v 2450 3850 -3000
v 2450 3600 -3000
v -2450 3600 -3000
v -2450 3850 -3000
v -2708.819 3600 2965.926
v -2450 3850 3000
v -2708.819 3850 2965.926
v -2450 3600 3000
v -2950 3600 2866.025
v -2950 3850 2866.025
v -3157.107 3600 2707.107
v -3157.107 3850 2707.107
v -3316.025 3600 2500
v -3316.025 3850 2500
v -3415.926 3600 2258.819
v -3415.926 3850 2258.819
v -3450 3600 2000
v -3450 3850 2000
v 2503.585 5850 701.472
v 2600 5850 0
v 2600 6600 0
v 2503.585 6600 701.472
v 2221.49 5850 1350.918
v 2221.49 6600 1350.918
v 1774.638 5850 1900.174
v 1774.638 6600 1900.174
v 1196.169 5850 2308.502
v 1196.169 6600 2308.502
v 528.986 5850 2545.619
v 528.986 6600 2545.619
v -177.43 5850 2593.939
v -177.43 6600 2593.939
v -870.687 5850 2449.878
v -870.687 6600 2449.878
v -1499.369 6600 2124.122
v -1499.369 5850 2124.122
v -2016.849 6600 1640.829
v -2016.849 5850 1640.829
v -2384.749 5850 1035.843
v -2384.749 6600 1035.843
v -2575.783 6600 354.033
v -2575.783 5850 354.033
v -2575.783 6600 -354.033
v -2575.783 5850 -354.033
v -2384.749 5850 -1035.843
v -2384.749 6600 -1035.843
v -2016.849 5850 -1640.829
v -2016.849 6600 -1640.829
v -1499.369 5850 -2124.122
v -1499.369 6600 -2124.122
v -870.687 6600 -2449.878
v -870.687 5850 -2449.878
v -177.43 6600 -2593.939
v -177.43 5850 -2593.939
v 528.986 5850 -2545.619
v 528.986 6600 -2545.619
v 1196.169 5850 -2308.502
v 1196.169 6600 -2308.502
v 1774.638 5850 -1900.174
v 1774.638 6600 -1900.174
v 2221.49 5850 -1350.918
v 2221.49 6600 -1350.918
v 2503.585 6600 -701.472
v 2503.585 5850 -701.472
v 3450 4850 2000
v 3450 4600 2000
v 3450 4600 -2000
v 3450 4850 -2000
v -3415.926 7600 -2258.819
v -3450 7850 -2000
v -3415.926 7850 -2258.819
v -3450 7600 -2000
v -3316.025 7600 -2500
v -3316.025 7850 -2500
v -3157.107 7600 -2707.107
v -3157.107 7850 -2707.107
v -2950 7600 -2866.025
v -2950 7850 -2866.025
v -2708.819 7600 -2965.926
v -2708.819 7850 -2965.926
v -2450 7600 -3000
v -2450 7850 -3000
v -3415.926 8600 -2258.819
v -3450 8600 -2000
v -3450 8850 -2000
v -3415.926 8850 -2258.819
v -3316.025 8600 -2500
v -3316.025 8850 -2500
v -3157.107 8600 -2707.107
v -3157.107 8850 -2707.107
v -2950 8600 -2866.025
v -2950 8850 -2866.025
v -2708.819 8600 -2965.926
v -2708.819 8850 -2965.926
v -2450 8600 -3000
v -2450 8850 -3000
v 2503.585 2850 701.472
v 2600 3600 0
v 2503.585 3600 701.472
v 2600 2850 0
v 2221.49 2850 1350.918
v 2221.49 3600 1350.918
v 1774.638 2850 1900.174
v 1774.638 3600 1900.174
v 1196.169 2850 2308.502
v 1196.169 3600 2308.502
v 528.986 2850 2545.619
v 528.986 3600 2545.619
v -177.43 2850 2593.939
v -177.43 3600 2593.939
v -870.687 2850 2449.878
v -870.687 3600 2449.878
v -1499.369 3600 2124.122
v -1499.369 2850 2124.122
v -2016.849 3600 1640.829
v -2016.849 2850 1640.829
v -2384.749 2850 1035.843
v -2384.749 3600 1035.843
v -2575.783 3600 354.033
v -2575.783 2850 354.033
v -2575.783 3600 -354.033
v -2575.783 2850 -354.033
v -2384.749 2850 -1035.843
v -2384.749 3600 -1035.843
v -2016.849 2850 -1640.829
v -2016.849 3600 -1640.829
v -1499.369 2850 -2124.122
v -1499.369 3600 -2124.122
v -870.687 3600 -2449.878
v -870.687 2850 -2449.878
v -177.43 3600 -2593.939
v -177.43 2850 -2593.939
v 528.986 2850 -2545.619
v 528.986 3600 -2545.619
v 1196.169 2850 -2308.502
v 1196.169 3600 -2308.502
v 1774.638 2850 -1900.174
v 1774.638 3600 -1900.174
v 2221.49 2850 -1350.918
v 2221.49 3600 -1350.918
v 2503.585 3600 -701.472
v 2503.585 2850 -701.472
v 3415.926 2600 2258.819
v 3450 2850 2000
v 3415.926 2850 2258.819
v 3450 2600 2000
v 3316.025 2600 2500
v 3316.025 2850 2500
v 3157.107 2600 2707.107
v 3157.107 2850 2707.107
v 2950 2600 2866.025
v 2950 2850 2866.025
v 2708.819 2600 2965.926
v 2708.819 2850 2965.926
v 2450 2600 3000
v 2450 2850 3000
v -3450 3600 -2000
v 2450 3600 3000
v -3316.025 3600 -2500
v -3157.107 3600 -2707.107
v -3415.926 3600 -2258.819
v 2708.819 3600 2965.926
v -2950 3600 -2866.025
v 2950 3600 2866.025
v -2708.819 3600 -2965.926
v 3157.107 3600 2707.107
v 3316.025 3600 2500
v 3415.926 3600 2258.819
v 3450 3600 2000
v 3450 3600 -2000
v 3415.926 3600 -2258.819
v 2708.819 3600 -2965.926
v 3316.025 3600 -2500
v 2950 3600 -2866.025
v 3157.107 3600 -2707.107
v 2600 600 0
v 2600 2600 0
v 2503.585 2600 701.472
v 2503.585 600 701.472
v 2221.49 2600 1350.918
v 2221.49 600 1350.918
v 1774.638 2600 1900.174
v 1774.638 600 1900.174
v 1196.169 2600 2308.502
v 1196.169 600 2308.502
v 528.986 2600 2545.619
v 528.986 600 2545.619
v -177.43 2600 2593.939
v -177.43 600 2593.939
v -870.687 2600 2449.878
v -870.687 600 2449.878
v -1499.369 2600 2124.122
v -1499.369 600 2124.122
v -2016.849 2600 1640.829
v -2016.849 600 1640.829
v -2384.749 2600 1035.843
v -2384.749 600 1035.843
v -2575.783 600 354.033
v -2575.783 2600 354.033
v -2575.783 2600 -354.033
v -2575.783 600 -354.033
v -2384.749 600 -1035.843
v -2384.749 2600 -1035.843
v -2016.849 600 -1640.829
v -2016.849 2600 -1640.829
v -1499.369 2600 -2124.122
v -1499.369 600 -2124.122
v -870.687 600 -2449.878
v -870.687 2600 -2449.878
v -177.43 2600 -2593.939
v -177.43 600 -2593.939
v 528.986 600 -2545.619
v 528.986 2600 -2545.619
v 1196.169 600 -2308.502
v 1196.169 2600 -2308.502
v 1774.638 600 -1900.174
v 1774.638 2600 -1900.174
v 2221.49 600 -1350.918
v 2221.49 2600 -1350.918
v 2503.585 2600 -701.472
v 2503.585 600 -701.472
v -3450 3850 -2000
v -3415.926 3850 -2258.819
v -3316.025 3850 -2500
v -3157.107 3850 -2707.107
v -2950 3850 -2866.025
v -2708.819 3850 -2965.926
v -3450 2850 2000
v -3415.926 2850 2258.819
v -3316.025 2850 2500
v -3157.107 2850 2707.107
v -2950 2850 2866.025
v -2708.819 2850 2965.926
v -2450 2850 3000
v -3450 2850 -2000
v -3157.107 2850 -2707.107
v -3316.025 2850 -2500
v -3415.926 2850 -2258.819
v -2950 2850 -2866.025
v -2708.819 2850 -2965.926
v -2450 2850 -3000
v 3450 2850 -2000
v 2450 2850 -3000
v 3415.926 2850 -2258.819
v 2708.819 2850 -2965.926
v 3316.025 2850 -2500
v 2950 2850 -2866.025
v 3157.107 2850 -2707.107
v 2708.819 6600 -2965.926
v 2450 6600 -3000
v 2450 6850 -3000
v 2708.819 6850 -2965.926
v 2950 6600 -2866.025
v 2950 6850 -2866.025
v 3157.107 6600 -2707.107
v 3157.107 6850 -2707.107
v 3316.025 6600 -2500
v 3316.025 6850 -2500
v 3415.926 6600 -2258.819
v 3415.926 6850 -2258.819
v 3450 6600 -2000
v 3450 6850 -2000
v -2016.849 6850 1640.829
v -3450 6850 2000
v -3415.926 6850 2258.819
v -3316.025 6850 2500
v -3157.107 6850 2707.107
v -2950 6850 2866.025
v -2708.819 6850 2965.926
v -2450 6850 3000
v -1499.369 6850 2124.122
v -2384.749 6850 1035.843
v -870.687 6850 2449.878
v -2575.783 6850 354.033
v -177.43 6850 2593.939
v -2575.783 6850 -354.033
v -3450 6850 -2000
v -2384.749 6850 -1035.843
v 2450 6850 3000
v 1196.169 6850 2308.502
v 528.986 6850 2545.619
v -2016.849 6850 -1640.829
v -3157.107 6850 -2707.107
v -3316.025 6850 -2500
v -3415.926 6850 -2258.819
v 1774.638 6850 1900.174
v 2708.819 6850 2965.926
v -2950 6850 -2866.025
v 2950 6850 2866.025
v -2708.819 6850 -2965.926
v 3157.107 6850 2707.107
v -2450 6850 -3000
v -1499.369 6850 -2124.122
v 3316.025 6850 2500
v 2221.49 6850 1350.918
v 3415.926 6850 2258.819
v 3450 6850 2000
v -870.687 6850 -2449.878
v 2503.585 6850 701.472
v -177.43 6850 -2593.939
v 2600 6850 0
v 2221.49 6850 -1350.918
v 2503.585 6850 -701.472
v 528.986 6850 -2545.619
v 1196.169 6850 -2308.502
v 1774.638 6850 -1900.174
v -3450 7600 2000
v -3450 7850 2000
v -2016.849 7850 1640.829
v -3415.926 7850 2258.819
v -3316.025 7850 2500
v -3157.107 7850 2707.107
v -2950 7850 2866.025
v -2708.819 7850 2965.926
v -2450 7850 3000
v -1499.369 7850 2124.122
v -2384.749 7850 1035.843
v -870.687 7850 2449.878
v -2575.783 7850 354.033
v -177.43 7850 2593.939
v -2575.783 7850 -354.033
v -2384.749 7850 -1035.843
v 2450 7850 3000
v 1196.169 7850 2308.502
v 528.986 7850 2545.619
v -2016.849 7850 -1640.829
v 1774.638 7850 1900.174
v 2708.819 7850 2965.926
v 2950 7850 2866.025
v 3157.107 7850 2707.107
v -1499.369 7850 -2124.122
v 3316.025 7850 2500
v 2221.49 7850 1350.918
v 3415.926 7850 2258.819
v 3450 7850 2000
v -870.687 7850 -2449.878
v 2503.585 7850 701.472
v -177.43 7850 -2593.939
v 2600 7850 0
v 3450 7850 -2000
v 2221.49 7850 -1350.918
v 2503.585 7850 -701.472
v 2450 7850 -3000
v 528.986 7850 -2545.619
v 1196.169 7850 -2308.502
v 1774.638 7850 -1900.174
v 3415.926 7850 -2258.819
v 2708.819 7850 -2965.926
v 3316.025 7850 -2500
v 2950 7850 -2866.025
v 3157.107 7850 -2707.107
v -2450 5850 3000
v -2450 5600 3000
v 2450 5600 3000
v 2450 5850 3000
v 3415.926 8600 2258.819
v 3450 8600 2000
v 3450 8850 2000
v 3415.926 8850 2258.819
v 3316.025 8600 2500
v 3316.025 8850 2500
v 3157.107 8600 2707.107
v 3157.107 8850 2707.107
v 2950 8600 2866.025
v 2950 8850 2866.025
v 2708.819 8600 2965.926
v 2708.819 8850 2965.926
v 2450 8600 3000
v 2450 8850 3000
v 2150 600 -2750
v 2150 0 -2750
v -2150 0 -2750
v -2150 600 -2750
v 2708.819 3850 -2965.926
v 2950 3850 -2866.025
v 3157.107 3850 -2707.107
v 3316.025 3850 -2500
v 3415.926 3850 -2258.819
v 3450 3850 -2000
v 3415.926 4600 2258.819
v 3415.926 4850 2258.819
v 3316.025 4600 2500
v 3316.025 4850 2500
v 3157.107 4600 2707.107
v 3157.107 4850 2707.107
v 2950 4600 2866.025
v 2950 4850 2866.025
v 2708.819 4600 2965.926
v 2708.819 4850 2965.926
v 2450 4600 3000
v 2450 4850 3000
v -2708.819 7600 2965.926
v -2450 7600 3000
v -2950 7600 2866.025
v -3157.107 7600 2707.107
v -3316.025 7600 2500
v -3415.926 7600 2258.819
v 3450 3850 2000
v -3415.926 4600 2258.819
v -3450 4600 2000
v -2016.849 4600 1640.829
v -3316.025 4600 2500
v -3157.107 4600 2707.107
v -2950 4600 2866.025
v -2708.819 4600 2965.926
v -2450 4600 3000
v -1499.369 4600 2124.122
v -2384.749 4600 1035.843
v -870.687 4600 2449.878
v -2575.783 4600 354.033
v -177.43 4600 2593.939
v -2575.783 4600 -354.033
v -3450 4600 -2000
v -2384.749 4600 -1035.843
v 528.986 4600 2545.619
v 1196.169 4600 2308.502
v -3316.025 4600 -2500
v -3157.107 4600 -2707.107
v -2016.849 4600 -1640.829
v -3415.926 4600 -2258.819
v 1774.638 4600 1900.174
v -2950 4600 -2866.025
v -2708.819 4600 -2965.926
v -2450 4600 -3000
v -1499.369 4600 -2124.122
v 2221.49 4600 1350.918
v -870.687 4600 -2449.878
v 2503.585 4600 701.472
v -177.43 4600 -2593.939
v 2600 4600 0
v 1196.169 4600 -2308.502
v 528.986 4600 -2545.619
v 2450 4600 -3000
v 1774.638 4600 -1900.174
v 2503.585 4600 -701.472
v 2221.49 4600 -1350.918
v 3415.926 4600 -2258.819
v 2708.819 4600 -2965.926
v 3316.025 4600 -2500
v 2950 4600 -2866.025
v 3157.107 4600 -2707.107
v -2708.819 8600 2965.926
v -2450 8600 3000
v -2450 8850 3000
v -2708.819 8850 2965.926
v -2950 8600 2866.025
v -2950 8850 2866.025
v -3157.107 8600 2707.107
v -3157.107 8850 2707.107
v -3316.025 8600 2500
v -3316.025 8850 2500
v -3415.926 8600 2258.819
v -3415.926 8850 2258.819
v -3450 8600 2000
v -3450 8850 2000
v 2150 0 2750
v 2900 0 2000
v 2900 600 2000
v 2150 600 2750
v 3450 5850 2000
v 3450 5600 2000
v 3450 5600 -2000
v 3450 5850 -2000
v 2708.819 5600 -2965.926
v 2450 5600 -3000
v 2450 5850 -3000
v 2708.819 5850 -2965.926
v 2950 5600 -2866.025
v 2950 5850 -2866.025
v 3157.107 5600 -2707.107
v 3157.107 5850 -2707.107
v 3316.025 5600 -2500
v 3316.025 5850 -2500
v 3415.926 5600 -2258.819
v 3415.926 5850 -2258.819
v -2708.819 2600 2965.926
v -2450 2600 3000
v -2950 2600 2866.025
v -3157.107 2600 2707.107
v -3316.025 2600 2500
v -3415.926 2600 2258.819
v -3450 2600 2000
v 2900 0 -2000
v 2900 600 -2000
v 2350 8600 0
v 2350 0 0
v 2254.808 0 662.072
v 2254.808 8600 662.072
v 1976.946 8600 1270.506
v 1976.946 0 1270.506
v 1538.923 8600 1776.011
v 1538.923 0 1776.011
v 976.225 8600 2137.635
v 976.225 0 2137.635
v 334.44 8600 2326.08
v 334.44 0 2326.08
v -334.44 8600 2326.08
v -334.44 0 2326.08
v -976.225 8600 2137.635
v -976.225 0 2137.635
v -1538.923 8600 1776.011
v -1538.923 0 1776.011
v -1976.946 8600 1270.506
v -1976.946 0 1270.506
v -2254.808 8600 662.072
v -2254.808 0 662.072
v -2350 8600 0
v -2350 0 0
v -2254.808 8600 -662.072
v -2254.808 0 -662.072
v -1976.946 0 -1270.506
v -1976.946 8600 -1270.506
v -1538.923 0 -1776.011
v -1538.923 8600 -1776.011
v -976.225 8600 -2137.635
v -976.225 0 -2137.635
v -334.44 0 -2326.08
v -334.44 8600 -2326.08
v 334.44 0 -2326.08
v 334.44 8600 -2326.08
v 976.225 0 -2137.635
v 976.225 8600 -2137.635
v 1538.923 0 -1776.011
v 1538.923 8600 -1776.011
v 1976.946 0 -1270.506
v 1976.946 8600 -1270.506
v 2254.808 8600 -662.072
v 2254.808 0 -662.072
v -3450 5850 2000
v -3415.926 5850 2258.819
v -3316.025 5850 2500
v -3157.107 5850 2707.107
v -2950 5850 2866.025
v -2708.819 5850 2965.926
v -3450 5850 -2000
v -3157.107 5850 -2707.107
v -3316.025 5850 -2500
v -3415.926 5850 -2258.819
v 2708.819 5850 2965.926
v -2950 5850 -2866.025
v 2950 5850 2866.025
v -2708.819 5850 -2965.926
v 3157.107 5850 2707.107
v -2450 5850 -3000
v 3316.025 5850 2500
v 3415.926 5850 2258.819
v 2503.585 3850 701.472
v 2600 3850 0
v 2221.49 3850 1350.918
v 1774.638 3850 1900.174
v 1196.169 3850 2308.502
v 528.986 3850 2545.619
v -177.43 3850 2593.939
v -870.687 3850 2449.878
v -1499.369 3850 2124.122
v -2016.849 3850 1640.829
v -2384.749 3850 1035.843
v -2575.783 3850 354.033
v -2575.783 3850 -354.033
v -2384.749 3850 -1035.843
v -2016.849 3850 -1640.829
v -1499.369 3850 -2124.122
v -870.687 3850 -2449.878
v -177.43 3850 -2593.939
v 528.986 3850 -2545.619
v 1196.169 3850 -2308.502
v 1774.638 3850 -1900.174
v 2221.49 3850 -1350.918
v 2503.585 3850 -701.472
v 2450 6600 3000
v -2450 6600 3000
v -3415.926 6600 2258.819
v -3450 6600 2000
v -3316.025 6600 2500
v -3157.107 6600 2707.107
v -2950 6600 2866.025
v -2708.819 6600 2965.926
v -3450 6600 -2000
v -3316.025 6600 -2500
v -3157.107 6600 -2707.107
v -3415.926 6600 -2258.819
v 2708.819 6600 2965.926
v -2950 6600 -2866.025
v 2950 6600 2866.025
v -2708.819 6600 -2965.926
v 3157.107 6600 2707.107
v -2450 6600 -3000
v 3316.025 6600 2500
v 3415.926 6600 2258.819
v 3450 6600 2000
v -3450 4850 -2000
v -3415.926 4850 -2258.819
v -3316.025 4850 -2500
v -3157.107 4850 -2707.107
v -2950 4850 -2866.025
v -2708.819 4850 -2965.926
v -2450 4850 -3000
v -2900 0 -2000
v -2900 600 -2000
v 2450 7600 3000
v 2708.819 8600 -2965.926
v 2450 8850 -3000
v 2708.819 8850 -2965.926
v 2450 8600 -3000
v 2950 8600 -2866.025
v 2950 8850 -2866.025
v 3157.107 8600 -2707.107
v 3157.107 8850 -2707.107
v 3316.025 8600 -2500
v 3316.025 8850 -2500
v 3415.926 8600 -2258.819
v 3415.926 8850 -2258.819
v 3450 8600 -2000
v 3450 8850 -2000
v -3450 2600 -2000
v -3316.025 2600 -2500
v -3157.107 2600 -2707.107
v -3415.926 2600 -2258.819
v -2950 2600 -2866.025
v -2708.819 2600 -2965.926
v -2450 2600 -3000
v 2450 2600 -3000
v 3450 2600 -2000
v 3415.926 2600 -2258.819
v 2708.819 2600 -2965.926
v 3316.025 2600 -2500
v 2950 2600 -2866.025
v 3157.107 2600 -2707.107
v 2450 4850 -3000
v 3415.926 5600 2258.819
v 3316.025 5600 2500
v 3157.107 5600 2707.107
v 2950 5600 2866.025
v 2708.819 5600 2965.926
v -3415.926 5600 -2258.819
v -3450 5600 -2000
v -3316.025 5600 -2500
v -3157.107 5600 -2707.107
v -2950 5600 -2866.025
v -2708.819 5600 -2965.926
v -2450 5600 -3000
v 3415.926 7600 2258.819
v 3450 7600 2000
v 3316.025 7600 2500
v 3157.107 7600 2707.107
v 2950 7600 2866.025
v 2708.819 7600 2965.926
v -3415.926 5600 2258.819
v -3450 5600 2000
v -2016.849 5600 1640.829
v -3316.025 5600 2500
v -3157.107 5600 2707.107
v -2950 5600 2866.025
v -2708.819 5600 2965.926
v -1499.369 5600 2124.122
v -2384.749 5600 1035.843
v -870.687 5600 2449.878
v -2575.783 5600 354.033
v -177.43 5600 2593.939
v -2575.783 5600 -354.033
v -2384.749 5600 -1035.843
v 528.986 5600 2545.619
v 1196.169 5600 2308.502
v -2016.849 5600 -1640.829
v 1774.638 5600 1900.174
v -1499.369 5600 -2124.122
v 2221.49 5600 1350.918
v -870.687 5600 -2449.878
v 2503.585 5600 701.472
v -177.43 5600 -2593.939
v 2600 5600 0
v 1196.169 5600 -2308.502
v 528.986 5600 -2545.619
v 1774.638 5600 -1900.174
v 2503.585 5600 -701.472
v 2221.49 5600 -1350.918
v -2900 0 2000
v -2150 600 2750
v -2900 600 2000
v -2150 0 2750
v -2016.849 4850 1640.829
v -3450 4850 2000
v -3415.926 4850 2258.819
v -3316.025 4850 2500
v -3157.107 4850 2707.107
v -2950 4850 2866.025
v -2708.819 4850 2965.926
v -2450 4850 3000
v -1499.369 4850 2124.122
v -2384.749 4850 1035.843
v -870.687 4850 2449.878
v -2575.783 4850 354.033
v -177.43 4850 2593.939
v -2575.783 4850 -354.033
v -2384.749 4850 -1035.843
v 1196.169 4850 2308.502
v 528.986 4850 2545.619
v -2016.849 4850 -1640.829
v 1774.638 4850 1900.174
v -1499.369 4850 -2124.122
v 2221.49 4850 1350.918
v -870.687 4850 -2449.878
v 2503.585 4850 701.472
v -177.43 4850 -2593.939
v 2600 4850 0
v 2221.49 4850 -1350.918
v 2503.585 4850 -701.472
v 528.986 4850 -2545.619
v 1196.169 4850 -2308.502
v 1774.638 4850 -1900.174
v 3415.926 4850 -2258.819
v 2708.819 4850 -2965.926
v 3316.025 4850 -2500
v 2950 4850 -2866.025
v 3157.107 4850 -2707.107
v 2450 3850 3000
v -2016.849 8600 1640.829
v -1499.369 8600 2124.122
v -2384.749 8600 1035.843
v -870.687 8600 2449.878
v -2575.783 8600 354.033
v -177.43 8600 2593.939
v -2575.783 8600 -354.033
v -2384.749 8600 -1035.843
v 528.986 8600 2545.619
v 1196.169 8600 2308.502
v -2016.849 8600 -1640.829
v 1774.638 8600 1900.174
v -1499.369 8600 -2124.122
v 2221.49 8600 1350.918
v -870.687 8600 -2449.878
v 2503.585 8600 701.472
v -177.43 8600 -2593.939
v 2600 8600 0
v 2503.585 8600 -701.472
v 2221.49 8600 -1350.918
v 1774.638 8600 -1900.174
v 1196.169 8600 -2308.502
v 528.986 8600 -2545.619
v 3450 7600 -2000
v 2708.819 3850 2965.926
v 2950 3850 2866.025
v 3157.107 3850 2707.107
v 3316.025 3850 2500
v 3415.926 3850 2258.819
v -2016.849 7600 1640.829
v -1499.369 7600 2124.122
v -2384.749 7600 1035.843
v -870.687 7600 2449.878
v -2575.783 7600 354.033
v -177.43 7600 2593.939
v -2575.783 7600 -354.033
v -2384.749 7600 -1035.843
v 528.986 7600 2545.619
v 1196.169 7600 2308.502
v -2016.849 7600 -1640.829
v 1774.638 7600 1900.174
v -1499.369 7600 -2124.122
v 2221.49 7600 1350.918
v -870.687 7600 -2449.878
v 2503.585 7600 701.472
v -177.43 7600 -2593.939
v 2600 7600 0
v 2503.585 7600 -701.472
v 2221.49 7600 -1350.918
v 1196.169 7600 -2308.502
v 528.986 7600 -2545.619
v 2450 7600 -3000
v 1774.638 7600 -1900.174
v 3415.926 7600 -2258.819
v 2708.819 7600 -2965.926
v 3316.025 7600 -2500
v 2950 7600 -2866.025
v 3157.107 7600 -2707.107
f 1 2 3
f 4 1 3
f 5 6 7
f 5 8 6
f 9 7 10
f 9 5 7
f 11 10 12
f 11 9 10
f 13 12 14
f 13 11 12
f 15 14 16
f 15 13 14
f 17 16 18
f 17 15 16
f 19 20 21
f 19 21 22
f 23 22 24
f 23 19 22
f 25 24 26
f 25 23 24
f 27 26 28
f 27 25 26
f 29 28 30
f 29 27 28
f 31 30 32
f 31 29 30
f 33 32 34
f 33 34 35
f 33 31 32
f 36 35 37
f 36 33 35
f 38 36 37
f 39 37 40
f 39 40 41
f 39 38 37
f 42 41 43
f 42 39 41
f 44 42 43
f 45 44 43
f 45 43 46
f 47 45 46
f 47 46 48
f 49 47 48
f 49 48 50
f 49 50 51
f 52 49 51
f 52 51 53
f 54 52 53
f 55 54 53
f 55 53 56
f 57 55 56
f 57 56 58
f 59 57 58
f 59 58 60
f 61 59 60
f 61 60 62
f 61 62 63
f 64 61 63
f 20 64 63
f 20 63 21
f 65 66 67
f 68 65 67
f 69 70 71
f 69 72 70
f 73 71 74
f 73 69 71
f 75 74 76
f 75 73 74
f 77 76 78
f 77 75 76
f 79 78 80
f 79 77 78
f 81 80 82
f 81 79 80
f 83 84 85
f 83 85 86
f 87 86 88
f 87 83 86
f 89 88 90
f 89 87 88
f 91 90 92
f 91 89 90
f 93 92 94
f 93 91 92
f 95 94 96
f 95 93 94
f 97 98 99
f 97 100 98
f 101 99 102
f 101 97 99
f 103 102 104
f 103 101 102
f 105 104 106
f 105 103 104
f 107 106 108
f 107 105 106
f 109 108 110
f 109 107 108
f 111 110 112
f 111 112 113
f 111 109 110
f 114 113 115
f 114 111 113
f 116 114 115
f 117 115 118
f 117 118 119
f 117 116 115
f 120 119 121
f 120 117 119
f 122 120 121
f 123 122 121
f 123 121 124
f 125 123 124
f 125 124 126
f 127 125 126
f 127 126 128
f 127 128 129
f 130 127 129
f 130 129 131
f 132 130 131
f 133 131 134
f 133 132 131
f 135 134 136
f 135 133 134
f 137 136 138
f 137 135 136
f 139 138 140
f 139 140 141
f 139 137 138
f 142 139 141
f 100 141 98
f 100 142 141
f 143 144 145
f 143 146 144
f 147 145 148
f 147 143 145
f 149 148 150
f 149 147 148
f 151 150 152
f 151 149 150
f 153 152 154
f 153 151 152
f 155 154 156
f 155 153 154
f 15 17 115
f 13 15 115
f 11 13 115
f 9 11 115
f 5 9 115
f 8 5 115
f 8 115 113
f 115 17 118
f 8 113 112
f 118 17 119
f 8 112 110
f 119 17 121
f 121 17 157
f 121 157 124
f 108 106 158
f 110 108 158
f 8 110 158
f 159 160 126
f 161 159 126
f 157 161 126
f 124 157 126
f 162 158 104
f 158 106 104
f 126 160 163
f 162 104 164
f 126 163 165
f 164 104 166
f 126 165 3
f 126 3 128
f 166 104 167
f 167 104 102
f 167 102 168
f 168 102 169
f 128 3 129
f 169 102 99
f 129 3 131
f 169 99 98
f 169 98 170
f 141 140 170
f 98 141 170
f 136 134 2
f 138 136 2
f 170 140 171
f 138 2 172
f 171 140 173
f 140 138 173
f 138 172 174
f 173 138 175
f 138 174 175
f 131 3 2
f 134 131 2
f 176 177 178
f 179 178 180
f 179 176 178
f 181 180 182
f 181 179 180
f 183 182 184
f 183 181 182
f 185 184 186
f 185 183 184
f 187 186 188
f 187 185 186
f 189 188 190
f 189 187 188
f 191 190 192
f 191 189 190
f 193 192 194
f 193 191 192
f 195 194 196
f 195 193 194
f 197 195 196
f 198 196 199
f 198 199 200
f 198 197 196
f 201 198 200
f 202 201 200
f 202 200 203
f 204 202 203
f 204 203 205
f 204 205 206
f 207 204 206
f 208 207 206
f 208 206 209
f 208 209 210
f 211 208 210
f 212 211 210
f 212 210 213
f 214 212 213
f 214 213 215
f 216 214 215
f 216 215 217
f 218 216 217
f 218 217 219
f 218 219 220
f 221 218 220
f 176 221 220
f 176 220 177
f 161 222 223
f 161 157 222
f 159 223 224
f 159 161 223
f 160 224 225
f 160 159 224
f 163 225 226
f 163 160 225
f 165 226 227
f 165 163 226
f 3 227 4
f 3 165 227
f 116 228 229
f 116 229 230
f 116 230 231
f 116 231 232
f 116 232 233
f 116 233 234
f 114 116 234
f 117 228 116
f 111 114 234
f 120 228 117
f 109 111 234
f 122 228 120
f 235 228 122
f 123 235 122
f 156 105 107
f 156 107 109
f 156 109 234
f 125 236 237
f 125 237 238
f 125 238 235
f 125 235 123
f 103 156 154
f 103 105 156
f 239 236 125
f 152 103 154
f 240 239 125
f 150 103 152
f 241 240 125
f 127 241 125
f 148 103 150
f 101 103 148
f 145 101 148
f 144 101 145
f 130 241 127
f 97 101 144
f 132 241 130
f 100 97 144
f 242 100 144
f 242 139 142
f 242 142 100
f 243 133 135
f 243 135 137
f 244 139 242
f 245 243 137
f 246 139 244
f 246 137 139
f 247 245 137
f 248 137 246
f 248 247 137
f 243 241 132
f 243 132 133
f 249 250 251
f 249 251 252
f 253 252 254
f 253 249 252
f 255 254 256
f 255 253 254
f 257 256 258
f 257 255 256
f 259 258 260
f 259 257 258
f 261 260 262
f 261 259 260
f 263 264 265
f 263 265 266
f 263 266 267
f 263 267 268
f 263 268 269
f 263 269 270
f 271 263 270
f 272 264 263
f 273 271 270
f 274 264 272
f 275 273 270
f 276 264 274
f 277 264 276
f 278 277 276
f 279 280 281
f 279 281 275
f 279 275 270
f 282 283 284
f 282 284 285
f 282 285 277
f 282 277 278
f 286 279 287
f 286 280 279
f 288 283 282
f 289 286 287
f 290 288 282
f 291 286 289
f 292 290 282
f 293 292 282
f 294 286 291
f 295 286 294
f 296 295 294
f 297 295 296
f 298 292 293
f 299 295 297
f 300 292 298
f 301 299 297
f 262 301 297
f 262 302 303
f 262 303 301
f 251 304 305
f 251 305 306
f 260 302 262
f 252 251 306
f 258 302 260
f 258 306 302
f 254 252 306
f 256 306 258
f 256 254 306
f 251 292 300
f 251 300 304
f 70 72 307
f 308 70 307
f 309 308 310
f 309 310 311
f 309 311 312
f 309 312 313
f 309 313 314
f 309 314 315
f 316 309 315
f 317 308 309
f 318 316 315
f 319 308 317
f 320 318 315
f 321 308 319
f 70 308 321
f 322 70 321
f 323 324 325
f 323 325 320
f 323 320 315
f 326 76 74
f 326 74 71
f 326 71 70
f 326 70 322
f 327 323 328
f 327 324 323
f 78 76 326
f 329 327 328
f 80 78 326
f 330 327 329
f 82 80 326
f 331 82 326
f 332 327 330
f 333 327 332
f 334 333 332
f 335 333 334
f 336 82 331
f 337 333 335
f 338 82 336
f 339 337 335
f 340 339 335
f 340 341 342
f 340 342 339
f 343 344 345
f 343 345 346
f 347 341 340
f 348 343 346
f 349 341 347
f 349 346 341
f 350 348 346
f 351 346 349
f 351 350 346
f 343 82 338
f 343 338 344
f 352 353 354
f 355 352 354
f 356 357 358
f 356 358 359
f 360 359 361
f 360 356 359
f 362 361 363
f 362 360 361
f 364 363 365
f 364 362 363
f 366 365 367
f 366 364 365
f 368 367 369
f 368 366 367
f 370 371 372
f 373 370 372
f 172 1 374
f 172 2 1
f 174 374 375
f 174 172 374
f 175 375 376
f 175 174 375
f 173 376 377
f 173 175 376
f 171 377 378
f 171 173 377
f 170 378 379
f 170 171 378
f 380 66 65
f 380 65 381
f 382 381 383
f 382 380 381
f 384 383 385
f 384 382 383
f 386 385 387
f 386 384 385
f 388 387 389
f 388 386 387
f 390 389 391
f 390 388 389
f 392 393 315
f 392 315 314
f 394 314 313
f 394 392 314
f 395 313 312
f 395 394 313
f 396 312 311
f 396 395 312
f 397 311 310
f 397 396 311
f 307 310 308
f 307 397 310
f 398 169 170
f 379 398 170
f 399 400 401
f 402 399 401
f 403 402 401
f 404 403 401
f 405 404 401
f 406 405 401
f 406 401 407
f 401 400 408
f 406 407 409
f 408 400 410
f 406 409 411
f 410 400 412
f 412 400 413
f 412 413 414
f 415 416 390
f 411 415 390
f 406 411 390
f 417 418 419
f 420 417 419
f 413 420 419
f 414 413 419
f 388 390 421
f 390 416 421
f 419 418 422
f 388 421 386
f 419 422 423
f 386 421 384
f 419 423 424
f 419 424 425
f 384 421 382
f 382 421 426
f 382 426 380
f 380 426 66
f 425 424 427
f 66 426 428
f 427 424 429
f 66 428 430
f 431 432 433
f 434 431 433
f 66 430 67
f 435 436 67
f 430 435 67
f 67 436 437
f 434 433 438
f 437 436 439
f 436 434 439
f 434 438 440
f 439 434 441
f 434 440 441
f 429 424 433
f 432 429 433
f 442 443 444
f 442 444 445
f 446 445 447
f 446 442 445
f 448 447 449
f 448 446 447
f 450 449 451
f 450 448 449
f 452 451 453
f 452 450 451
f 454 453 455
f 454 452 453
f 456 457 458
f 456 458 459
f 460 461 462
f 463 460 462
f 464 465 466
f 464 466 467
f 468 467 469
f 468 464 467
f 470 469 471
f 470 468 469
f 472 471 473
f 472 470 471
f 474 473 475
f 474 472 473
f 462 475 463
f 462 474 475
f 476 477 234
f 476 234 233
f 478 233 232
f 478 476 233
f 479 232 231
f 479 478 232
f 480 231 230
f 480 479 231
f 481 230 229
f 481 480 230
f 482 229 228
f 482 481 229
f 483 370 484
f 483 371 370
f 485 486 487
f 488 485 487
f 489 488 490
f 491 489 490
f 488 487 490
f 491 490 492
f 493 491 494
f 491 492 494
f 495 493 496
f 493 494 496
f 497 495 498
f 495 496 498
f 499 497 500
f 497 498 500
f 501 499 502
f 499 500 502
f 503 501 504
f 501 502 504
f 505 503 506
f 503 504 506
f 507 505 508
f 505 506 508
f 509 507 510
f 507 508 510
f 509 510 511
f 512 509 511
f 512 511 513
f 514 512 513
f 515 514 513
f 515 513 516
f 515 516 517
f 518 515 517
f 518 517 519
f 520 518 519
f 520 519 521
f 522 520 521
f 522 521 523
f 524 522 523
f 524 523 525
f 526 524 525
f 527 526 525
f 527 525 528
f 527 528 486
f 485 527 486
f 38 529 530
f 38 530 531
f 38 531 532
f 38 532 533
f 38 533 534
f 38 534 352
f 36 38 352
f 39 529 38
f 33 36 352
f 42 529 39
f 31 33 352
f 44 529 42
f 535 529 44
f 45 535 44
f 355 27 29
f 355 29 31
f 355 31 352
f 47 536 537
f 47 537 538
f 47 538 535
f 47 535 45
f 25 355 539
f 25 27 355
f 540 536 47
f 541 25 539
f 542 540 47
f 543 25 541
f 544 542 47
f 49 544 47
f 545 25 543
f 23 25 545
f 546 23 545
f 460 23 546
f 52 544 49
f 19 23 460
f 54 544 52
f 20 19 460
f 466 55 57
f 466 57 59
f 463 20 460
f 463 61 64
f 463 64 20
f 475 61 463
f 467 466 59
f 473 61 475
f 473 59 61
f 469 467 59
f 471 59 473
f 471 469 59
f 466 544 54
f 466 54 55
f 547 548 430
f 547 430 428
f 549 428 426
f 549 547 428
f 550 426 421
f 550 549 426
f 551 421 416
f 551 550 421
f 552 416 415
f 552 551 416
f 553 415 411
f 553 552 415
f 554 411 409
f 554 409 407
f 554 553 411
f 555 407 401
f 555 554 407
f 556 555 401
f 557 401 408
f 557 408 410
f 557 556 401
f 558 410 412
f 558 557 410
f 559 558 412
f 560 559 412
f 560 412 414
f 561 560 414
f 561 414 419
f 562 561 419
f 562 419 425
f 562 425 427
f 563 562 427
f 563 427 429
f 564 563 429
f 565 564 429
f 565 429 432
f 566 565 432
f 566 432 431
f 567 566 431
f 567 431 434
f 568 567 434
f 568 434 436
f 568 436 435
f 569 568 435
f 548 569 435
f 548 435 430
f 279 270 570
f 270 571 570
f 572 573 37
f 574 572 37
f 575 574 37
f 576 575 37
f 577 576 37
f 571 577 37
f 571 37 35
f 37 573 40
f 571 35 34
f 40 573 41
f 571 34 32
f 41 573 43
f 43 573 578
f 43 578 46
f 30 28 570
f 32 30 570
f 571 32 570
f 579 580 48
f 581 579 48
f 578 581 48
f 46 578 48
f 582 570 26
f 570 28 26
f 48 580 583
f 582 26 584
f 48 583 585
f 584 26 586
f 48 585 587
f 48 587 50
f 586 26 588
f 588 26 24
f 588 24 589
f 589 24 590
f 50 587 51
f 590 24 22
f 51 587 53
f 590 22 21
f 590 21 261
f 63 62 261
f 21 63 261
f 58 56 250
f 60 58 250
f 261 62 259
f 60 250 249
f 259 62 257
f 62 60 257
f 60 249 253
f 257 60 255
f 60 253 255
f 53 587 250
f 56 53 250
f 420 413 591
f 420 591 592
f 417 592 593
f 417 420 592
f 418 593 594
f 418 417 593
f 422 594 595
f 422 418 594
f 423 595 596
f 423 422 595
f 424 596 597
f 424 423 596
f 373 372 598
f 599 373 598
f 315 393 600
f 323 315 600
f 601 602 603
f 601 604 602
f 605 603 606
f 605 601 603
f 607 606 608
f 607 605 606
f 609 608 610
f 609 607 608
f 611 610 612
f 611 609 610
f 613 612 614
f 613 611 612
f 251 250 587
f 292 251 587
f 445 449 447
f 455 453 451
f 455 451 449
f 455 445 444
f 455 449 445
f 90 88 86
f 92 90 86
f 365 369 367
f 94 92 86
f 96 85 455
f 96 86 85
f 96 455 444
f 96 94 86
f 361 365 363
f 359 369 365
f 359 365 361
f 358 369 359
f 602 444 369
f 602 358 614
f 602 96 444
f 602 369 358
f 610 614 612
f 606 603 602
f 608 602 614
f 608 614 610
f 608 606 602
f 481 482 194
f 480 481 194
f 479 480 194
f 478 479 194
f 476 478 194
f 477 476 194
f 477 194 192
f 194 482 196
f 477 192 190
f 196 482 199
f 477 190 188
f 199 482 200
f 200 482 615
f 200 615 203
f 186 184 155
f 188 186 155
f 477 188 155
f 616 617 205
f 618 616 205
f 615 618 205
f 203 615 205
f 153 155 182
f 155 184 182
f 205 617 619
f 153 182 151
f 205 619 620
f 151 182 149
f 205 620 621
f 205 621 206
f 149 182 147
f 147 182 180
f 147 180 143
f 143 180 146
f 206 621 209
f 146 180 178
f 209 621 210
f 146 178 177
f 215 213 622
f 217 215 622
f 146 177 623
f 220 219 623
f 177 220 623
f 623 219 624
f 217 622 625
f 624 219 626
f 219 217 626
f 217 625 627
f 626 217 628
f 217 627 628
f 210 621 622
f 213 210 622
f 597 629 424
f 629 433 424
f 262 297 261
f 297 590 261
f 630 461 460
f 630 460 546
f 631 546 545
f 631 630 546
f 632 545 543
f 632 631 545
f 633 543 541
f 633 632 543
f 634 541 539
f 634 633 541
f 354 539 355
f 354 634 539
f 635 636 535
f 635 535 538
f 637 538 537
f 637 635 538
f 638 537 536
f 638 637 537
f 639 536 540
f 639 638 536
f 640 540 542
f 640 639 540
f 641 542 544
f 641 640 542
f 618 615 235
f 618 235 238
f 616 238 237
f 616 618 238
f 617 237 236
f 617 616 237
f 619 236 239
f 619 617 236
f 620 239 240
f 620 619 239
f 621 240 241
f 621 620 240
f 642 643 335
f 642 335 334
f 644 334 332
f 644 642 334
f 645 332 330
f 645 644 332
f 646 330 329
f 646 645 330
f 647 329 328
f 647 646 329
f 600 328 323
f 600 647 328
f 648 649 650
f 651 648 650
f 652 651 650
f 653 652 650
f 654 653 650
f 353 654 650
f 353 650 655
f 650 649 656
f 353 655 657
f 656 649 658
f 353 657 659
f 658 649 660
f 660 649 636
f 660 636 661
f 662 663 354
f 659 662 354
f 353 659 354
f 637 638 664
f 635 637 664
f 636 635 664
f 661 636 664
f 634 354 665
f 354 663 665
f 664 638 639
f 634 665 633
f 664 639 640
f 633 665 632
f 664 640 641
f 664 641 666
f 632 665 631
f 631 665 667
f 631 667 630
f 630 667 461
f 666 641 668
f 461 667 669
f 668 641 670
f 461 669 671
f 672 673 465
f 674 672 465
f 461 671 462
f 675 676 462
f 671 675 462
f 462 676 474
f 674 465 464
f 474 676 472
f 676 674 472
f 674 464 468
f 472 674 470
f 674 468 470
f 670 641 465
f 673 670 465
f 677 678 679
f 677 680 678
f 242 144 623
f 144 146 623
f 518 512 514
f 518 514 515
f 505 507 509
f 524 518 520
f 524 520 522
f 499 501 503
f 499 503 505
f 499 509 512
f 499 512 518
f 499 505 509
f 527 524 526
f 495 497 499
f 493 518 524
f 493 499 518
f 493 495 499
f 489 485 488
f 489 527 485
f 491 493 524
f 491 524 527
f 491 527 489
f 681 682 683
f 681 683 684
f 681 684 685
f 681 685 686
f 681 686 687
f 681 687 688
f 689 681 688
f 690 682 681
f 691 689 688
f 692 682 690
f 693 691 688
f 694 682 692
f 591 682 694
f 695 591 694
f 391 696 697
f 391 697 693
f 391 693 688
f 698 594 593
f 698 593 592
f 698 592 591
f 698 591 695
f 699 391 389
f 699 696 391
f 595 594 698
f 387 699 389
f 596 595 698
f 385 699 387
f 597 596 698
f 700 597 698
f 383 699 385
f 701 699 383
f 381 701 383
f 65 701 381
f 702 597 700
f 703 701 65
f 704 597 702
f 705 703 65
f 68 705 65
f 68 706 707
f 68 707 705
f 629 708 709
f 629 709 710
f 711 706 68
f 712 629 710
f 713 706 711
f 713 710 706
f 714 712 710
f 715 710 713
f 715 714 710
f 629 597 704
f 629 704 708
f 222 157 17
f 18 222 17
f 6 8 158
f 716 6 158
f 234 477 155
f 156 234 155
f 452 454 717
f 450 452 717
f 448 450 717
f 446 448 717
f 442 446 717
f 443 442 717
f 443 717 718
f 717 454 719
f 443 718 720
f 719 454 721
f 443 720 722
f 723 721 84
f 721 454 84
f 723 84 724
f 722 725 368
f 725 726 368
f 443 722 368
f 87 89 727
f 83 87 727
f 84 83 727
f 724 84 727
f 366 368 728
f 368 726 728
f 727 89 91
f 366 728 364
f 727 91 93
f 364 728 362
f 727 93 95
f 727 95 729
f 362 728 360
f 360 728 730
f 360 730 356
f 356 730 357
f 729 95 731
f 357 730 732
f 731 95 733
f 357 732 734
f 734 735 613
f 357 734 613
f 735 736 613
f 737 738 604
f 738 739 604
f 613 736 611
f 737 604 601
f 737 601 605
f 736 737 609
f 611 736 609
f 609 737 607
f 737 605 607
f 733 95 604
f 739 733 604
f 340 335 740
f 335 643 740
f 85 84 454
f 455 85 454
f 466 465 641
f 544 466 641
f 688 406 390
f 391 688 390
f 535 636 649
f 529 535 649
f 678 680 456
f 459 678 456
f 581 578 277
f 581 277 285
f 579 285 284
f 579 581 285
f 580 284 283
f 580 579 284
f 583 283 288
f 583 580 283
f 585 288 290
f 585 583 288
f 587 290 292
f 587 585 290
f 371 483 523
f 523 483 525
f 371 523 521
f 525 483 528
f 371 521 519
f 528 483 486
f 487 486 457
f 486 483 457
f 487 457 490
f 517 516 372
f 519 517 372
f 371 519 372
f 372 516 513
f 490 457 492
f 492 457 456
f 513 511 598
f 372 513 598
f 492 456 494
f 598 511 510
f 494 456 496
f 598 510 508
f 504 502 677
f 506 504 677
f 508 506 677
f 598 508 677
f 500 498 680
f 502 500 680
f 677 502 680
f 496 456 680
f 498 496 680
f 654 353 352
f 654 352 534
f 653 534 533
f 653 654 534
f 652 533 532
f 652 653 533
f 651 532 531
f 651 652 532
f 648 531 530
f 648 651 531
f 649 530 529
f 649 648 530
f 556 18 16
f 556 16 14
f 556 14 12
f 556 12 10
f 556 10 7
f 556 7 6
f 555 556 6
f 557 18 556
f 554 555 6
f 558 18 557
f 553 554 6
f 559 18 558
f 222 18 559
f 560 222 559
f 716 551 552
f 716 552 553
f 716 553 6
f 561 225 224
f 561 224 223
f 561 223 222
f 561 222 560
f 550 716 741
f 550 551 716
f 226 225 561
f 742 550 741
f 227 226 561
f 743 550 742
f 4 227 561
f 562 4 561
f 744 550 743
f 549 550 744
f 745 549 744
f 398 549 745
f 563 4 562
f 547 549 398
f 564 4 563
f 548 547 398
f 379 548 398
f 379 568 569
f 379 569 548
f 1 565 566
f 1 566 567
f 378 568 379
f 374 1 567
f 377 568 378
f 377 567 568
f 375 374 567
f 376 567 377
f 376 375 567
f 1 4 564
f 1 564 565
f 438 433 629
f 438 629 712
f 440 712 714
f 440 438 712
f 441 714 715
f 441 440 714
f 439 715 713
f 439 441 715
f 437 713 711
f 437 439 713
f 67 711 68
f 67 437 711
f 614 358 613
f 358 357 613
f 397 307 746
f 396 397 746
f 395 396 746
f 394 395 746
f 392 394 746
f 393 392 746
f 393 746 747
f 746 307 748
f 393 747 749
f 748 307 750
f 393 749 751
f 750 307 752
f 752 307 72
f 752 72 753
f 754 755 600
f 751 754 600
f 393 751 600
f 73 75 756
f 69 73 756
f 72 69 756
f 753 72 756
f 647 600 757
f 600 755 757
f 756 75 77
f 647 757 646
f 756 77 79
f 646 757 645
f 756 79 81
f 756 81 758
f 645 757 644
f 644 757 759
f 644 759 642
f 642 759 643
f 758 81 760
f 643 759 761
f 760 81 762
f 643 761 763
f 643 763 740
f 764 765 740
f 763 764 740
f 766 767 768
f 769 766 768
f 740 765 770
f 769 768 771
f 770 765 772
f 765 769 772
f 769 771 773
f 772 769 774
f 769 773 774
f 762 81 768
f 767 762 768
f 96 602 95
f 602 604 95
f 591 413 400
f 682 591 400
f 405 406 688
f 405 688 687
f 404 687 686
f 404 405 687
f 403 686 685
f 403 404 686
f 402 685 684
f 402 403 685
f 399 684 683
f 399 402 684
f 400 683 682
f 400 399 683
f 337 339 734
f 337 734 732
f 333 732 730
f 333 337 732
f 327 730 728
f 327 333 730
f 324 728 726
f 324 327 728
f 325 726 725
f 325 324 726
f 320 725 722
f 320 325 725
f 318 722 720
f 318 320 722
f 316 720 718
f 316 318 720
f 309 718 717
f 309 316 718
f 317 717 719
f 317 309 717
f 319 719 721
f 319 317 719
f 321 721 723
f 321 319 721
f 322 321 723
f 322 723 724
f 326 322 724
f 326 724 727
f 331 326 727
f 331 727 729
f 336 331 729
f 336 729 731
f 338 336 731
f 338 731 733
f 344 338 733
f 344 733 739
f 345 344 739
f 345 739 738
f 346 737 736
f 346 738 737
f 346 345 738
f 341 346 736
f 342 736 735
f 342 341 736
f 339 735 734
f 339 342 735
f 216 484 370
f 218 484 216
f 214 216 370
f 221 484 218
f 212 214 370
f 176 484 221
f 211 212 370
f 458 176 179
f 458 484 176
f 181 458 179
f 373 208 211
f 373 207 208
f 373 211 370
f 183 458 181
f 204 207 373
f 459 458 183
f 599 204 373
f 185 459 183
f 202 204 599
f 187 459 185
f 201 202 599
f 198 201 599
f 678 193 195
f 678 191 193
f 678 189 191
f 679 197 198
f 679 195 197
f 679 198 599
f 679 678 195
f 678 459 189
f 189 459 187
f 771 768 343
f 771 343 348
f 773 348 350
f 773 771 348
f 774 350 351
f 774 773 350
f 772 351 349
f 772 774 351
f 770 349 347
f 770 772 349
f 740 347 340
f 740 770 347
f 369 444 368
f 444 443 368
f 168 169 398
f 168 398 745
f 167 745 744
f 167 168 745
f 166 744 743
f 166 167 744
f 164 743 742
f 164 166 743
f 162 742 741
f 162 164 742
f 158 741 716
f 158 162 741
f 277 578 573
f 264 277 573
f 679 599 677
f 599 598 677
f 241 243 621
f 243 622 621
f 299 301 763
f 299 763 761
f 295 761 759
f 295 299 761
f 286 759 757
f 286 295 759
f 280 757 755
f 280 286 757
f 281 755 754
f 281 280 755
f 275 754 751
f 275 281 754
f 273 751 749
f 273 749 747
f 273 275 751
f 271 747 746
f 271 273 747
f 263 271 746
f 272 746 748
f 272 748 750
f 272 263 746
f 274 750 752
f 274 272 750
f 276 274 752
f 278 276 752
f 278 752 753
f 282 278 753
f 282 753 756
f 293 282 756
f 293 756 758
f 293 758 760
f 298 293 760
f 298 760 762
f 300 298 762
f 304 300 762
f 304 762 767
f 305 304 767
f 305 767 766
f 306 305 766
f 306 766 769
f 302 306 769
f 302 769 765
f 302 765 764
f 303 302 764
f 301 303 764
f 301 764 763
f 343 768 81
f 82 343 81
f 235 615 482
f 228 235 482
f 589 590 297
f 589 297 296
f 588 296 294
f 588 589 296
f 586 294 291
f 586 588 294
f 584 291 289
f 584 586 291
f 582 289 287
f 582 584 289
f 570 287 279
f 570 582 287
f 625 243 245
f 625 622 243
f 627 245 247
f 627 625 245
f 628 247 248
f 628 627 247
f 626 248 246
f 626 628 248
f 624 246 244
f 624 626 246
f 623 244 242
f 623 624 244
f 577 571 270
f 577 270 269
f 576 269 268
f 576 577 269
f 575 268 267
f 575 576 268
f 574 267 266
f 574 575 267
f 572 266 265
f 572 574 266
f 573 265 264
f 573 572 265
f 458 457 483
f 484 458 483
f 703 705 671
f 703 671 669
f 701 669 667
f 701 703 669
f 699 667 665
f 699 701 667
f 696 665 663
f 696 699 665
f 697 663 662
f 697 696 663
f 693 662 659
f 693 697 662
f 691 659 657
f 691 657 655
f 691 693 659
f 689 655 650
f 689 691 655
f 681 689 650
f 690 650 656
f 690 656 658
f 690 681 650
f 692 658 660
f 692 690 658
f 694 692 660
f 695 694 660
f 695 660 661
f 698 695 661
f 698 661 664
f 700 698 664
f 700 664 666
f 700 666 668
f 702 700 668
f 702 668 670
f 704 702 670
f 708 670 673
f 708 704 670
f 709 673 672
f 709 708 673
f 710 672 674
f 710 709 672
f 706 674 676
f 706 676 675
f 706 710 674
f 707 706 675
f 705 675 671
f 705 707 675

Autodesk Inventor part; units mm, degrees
ref_plane "YZ Plane" through (0, 0, 0) normal (1, 0, 0) x (0, 1, 0)
ref_plane "XZ Plane" through (0, 0, 0) normal (0, 1, 0) x (-1, 0, 0)
ref_plane "XY Plane" through (0, 0, 0) normal (0, 0, 1) x (1, 0, 0)
sketch "Sketch1" plane through (0, 0, 0) normal (0, 1, 0) x (-1, 0, 0)
  line L0 (2900, -2000) -> (2900, 2000)
  line L1 (-2900, 2000) -> (-2900, -2000)
  line L2 (0, -2750) -> (-2150, -2750)
  line L3 (-2150, -2750) -> (2150, -2750)
  line L4 (0, 2750) -> (-2150, 2750)
  line L5 (-2150, 2750) -> (2150, 2750)
  line L6 (2150, -2750) -> (2900, -2000)
  line L7 (-2150, -2750) -> (-2900, -2000)
  line L8 (-2900, 2000) -> (-2150, 2750)
  line L9 (2150, 2750) -> (2900, 2000)
  point P0 (2900, -2750)
  point P1 (2900, 2750)
extrude "Extrusion1" add sketch "Sketch1" along normal blind 600
sketch "Sketch2" plane through (0, 600, 0) normal (0, 1, 0) x (1, 0, 0)
  circle A0 centre (0, 0) radius 2600
extrude "Extrusion2" add sketch "Sketch2" along normal blind 8000
sketch "Sketch4" plane through (0, 8600, 0) normal (0, 1, 0) x (1, 0, 0)
  line L0 (2450, 3000) -> (-2450, 3000)
  line L1 (-3450, 2000) -> (-3450, -2000)
  line L2 (-2450, -3000) -> (2450, -3000)
  line L3 (3450, -2000) -> (3450, 2000)
  arc A0 (-2450, 3000) -> (-3450, 2000) centre (-2450, 2000) ccw
  arc A1 (3450, 2000) -> (2450, 3000) centre (2450, 2000) ccw
  arc A2 (2450, -3000) -> (3450, -2000) centre (2450, -2000) ccw
  arc A3 (-3450, -2000) -> (-2450, -3000) centre (-2450, -2000) ccw
extrude "Extrusion3" add sketch "Sketch4" along normal blind 250
pattern_linear "Rectangular Pattern1" count 7 spacing 1000 along (0, -1, 0) of "Extrusion3"
sketch "Sketch5" plane through (0, 0, 0) normal (0, -1, 0) x (1, 0, 0)
  circle A0 centre (0, 0) radius 2350
  dimension "d29" = 4700
extrude "Extrusion4" cut sketch "Sketch5" against normal blind 8600
